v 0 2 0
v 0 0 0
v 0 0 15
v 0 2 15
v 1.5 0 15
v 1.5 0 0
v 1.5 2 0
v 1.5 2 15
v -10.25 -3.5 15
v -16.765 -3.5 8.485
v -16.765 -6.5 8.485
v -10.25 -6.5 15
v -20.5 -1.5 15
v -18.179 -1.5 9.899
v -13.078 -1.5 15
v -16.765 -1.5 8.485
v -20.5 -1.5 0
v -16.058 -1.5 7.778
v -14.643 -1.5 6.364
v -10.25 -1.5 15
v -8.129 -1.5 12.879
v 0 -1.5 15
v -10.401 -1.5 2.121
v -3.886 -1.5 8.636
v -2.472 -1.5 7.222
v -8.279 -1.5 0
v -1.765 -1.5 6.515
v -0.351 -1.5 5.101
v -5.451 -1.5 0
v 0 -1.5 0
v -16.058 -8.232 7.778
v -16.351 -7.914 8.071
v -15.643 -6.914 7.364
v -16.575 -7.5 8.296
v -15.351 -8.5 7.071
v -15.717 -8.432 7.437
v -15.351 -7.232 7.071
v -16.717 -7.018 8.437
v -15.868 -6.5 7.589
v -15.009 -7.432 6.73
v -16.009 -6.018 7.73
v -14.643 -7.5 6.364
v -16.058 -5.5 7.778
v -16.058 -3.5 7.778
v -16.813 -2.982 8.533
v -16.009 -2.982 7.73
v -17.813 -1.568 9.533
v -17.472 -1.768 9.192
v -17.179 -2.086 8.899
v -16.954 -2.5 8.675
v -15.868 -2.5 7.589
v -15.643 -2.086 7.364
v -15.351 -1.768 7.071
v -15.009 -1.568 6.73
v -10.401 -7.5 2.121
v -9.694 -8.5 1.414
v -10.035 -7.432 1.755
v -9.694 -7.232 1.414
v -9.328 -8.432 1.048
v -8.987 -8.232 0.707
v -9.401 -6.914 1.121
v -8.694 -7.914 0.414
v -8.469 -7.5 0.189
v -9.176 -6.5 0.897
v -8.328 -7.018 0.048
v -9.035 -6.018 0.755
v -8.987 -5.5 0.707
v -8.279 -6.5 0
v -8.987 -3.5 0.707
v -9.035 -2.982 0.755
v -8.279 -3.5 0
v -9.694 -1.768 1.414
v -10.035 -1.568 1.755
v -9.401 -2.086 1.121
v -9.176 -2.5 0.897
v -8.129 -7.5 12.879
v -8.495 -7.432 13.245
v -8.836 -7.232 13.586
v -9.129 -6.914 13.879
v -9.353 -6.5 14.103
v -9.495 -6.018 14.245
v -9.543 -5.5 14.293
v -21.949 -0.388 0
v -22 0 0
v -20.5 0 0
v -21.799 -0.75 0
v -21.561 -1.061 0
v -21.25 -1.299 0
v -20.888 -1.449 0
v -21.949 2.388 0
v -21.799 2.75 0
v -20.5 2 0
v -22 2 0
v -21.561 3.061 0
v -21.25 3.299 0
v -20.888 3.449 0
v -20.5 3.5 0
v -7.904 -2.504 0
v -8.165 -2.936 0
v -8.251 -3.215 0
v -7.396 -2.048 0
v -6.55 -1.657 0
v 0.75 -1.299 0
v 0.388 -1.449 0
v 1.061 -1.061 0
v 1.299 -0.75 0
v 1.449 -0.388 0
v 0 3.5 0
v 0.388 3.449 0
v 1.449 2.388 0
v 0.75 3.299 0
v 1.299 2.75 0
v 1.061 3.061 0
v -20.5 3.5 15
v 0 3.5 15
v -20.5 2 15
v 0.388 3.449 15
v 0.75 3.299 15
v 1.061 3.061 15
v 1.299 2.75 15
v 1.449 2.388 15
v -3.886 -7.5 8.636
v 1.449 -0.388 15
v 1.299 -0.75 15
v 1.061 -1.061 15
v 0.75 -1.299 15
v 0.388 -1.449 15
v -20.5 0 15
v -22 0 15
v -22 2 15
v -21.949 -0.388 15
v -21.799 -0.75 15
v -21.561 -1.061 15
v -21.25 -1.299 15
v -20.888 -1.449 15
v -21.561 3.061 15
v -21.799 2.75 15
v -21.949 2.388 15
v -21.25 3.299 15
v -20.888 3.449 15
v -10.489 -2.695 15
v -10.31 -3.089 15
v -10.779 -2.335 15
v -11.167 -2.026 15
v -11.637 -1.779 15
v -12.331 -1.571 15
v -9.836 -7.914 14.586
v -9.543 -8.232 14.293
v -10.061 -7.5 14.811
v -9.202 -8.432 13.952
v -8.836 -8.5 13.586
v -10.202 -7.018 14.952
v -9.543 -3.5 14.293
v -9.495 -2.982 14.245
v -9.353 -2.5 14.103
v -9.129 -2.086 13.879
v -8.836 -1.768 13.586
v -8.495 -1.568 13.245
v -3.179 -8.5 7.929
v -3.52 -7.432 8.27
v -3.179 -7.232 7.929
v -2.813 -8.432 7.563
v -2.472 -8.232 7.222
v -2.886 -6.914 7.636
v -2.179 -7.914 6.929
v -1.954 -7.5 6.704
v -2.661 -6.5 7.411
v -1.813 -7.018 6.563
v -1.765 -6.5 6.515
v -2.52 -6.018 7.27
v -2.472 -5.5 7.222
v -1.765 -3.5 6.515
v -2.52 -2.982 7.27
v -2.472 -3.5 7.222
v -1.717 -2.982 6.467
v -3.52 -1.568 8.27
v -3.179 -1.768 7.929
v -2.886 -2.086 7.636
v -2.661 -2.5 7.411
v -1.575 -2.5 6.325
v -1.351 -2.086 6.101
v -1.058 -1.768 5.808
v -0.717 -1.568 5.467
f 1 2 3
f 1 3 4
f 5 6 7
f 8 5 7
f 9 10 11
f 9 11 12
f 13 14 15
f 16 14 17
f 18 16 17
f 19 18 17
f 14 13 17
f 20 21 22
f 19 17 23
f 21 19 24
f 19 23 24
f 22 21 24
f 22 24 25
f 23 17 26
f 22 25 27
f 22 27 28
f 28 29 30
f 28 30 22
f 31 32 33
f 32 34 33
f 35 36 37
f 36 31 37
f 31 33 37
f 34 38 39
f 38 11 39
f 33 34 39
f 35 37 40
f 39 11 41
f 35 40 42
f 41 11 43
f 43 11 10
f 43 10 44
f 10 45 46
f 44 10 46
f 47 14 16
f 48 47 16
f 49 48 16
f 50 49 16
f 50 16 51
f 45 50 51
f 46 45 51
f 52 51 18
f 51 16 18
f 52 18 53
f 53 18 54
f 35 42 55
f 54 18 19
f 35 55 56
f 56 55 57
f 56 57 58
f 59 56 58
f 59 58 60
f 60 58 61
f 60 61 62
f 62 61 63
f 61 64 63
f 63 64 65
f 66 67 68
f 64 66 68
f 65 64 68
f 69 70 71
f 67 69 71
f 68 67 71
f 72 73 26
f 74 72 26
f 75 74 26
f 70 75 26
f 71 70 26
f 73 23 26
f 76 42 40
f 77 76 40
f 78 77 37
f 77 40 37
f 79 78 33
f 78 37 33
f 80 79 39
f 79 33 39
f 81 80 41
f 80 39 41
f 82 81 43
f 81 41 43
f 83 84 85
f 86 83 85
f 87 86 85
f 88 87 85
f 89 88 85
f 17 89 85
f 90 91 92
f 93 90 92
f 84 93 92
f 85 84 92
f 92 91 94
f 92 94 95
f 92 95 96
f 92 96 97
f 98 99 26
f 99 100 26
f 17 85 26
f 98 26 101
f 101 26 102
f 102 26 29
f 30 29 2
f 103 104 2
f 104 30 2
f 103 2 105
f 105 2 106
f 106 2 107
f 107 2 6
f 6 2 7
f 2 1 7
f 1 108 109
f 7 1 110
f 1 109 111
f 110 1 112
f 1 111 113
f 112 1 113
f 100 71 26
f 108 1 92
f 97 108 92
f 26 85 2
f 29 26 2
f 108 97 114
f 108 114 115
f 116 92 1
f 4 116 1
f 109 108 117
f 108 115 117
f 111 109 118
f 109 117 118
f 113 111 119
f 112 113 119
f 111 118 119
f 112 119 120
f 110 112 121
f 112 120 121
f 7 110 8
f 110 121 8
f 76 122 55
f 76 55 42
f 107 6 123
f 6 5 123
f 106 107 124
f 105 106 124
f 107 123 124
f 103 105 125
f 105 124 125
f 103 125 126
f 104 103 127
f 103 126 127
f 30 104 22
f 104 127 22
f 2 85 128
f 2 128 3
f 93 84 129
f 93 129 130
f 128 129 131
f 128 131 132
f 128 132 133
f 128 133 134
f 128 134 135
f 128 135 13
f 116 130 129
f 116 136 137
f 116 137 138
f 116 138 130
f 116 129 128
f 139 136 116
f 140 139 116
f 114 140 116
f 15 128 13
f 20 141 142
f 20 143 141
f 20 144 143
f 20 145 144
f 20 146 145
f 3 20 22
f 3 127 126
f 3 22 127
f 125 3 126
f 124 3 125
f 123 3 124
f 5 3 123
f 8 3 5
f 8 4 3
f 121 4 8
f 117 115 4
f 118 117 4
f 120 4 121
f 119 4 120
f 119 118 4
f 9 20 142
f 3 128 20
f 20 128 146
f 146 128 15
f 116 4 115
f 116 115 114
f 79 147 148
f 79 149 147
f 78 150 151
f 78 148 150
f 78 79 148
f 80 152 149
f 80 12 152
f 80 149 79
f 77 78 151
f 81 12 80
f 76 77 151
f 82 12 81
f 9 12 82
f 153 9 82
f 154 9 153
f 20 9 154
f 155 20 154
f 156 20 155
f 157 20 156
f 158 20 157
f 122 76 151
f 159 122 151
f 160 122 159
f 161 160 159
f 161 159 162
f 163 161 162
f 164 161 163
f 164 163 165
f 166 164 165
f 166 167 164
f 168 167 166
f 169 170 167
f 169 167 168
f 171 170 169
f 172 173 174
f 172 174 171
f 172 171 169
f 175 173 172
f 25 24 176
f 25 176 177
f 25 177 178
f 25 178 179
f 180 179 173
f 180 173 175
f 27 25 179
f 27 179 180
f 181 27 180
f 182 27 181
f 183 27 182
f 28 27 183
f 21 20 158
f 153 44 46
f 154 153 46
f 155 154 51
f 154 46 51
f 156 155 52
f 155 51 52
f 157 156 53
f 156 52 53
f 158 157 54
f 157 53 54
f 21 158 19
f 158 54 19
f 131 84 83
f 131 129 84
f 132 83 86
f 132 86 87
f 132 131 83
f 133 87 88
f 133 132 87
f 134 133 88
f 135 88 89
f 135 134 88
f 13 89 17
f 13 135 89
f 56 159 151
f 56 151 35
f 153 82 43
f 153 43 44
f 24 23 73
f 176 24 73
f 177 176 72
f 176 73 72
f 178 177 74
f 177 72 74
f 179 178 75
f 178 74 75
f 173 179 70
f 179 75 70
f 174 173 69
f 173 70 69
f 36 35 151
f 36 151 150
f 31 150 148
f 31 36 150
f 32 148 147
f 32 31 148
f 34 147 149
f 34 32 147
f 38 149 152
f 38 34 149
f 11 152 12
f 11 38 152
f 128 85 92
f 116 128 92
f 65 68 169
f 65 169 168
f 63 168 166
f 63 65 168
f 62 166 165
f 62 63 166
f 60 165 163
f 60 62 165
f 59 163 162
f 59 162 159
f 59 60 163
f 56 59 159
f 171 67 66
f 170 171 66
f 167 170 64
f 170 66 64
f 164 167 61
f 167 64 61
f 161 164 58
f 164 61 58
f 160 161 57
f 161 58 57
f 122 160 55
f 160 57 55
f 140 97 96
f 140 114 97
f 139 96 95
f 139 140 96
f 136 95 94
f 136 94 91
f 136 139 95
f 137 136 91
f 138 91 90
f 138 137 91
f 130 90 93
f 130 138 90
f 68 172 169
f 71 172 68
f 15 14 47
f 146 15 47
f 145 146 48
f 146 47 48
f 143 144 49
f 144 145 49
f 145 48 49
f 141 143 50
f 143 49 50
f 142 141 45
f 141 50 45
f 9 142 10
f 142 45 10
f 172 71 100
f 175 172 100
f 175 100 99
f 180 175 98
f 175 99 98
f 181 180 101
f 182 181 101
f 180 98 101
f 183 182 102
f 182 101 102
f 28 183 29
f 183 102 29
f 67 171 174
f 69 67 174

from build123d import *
from OCP.BRepAlgoAPI import BRepAlgoAPI_Cut
from OCP.TopTools import TopTools_ListOfShape

# Parameters (mm, degrees)
CROQUIS1_W              = 23.5
CROQUIS1_H              = 5
CROQUIS1_W_2            = 20.5
CROQUIS1_H_2            = 2
SALIENTE_EXTRUIR1_DEPTH = 15
SALIENTE_EXTRUIR2_DEPTH = 7
CROQUIS3_W              = 10
CROQUIS3_H              = 6
CORTAR_EXTRUIR1_DEPTH   = 9.213203
REDONDEO1_START         = -5.854446225
REDONDEO1_DEPTH         = 9.213203436
REDONDEO1_2_DEPTH       = 9.213203436
REDONDEO1_3_DEPTH       = 0.946564521
REDONDEO1_START_2       = 2.41219269
REDONDEO1_4_DEPTH       = 0.946564521
REDONDEO1_5_DEPTH       = 9.213203436
REDONDEO1_START_3       = -2
REDONDEO1_6_OUTLINE_W   = 11
REDONDEO1_6_OUTLINE_H   = 2.5
REDONDEO1_6_DEPTH       = 2
REDONDEO1_START_4       = 15
REDONDEO1_7_OUTLINE_W   = 11
REDONDEO1_7_OUTLINE_H   = 2.5
REDONDEO1_7_DEPTH       = 2
REDONDEO2_R             = 1.5


with BuildPart() as part:
    # Croquis1 → Saliente-Extruir1 (new body)
    with BuildSketch(Plane.XY):
        with Locations((-10.25, 1)):
            Rectangle(CROQUIS1_W, CROQUIS1_H)
        with Locations((-10.25, 1)):
            Rectangle(CROQUIS1_W_2, CROQUIS1_H_2, mode=Mode.SUBTRACT)
    extrude(amount=SALIENTE_EXTRUIR1_DEPTH)

    # Croquis2 → Saliente-Extruir2 (add)
    with BuildSketch(Plane.XZ.offset(1.5)):
        Polygon((-10.25, 15), (-1.764718626, 6.514718626), (-8.279437252, 0), (-16.764718626, 8.485281374), align=None)
    extrude(amount=SALIENTE_EXTRUIR2_DEPTH)


with BuildPart() as cortar_extruir1_tool:
    # Croquis3 → Cortar-Extruir1 (new body)
    with BuildSketch(Plane(origin=(-4.139718626, 0, -4.139718626), x_dir=(-0.7071067811865468, 0, 0.7071067811865482), z_dir=(-0.7071067811865482, 0, -0.7071067811865468))):
        with Locations((11.854446225, -4.5)):
            Rectangle(CROQUIS3_W, CROQUIS3_H)
    extrude(amount=-CORTAR_EXTRUIR1_DEPTH)


with BuildPart() as part_1:
    add(part.part)

    # Cortar-Extruir1: cut by cortar_extruir1_tool, with a tolerance
    cortar_extruir1_stock = TopTools_ListOfShape()
    cortar_extruir1_stock.Append(part_1.part.wrapped)
    cortar_extruir1_tools = TopTools_ListOfShape()
    cortar_extruir1_tools.Append(cortar_extruir1_tool.part.wrapped)
    cortar_extruir1_cut = BRepAlgoAPI_Cut()
    cortar_extruir1_cut.SetArguments(cortar_extruir1_stock)
    cortar_extruir1_cut.SetTools(cortar_extruir1_tools)
    cortar_extruir1_cut.SetFuzzyValue(0.00001)
    cortar_extruir1_cut.Build()
    add(Compound.cast(cortar_extruir1_cut.Shape()).solids(), mode=Mode.REPLACE)

    # Redondeo1: read off the stored shape, not the designer's step
    # Redondeo1 outline → Redondeo1 (cut)
    with BuildSketch(Plane(origin=(0, 0, 0), x_dir=(0.707106781186546, 0, -0.707106781186549), z_dir=(0.707106781186549, 0, 0.707106781186546)).offset(REDONDEO1_START)):
        with BuildLine():
            Line((-17.854446225, -8.5), (-15.854446225, -8.5))
            ThreePointArc((-15.854446225, -8.5), (-17.268659787, -7.914213562), (-17.854446225, -6.5))
            Line((-17.854446225, -6.5), (-17.854446225, -8.5))
        make_face()
        with BuildLine():
            ThreePointArc((-5.854446225, -6.5), (-6.440232663, -7.914213562), (-7.854446225, -8.5))
            Line((-7.854446225, -8.5), (-5.854446225, -8.5))
            Line((-5.854446225, -8.5), (-5.854446225, -6.5))
        make_face()
    extrude(amount=REDONDEO1_DEPTH, mode=Mode.SUBTRACT)

    # Redondeo1 2 outline → Redondeo1 2 (add)
    with BuildSketch(Plane(origin=(0, 0, 0), x_dir=(0.707106781186546, 0, -0.707106781186549), z_dir=(0.707106781186549, 0, 0.707106781186546)).offset(REDONDEO1_START)):
        with BuildLine():
            Line((-14.854446225, -1.5), (-16.854446225, -1.5))
            Line((-16.854446225, -1.5), (-16.854446225, -3.5))
            ThreePointArc((-16.854446225, -3.5), (-16.268659787, -2.085786438), (-14.854446225, -1.5))
        make_face()
        with BuildLine():
            Line((-6.854446225, -3.5), (-6.854446225, -1.5))
            Line((-6.854446225, -1.5), (-8.854446225, -1.5))
            ThreePointArc((-8.854446225, -1.5), (-7.440232663, -2.085786438), (-6.854446225, -3.5))
        make_face()
        with BuildLine():
            ThreePointArc((-14.854446225, -7.5), (-16.268659787, -6.914213562), (-16.854446225, -5.5))
            Line((-16.854446225, -5.5), (-16.854446225, -7.5))
            Line((-16.854446225, -7.5), (-14.854446225, -7.5))
        make_face()
        with BuildLine():
            Line((-6.854446225, -7.5), (-6.854446225, -5.5))
            ThreePointArc((-6.854446225, -5.5), (-7.440232663, -6.914213562), (-8.854446225, -7.5))
            Line((-8.854446225, -7.5), (-6.854446225, -7.5))
        make_face()
    extrude(amount=REDONDEO1_2_DEPTH)

    # Redondeo1 3 outline → Redondeo1 3 (add)
    with BuildSketch(Plane(origin=(0, 0, 0), x_dir=(0.707106781186546, 0, -0.707106781186549), z_dir=(0.707106781186549, 0, 0.707106781186546)).offset(REDONDEO1_START)):
        with BuildLine():
            ThreePointArc((-19.854446225, -1.5), (-18.440232663, -2.085786438), (-17.854446225, -3.5))
            Line((-17.854446225, -3.5), (-17.854446225, -1.5))
            Line((-17.854446225, -1.5), (-19.854446225, -1.5))
        make_face()
    extrude(amount=REDONDEO1_3_DEPTH)

    # Redondeo1 4 outline → Redondeo1 4 (add)
    with BuildSketch(Plane(origin=(0, 0, 0), x_dir=(0.707106781186546, 0, -0.707106781186549), z_dir=(0.707106781186549, 0, 0.707106781186546)).offset(REDONDEO1_START_2)):
        with BuildLine():
            Line((-5.854446225, -1.5), (-5.854446225, -3.5))
            ThreePointArc((-5.854446225, -3.5), (-5.268659787, -2.085786438), (-3.854446225, -1.5))
            Line((-3.854446225, -1.5), (-5.854446225, -1.5))
        make_face()
    extrude(amount=REDONDEO1_4_DEPTH)

    # Redondeo1 5 outline → Redondeo1 5 (add)
    with BuildSketch(Plane(origin=(0, 0, 0), x_dir=(0.7071067811865471, 0, -0.707106781186548), z_dir=(0.707106781186548, 0, 0.707106781186547)).offset(REDONDEO1_START)):
        with BuildLine():
            Line((-5.854446225, -1.5), (-5.854446225, -3.5))
            ThreePointArc((-5.854446225, -3.5), (-5.268659787, -2.085786438), (-3.854446225, -1.5))
            Line((-3.854446225, -1.5), (-5.854446225, -1.5))
        make_face()
        with BuildLine():
            Line((-17.854446225, -3.5), (-17.854446225, -1.5))
            Line((-17.854446225, -1.5), (-19.854446225, -1.5))
            ThreePointArc((-19.854446225, -1.5), (-18.440232663, -2.085786438), (-17.854446225, -3.5))
        make_face()
    extrude(amount=REDONDEO1_5_DEPTH)

    # Redondeo1 6 outline → Redondeo1 6 (cut)
    with BuildSketch(Plane.XY.offset(REDONDEO1_START_3)):
        with Locations((-9.5, -2.75)):
            Rectangle(REDONDEO1_6_OUTLINE_W, REDONDEO1_6_OUTLINE_H)
    extrude(amount=REDONDEO1_6_DEPTH, mode=Mode.SUBTRACT)

    # Redondeo1 7 outline → Redondeo1 7 (cut)
    with BuildSketch(Plane.XY.offset(REDONDEO1_START_4)):
        with Locations((-9.5, -2.75)):
            Rectangle(REDONDEO1_7_OUTLINE_W, REDONDEO1_7_OUTLINE_H)
    extrude(amount=REDONDEO1_7_DEPTH, mode=Mode.SUBTRACT)

    # Redondeo2
    redondeo2_edges = [part_1.edges().sort_by_distance(p)[0] for p in [
        (-22, -1.5, 7.5),
        (-22, 3.5, 7.5),
        (1.5, 3.5, 7.5),
        (1.5, -1.5, 7.5),
    ]]
    fillet(redondeo2_edges, radius=REDONDEO2_R)


solid = part_1.part
